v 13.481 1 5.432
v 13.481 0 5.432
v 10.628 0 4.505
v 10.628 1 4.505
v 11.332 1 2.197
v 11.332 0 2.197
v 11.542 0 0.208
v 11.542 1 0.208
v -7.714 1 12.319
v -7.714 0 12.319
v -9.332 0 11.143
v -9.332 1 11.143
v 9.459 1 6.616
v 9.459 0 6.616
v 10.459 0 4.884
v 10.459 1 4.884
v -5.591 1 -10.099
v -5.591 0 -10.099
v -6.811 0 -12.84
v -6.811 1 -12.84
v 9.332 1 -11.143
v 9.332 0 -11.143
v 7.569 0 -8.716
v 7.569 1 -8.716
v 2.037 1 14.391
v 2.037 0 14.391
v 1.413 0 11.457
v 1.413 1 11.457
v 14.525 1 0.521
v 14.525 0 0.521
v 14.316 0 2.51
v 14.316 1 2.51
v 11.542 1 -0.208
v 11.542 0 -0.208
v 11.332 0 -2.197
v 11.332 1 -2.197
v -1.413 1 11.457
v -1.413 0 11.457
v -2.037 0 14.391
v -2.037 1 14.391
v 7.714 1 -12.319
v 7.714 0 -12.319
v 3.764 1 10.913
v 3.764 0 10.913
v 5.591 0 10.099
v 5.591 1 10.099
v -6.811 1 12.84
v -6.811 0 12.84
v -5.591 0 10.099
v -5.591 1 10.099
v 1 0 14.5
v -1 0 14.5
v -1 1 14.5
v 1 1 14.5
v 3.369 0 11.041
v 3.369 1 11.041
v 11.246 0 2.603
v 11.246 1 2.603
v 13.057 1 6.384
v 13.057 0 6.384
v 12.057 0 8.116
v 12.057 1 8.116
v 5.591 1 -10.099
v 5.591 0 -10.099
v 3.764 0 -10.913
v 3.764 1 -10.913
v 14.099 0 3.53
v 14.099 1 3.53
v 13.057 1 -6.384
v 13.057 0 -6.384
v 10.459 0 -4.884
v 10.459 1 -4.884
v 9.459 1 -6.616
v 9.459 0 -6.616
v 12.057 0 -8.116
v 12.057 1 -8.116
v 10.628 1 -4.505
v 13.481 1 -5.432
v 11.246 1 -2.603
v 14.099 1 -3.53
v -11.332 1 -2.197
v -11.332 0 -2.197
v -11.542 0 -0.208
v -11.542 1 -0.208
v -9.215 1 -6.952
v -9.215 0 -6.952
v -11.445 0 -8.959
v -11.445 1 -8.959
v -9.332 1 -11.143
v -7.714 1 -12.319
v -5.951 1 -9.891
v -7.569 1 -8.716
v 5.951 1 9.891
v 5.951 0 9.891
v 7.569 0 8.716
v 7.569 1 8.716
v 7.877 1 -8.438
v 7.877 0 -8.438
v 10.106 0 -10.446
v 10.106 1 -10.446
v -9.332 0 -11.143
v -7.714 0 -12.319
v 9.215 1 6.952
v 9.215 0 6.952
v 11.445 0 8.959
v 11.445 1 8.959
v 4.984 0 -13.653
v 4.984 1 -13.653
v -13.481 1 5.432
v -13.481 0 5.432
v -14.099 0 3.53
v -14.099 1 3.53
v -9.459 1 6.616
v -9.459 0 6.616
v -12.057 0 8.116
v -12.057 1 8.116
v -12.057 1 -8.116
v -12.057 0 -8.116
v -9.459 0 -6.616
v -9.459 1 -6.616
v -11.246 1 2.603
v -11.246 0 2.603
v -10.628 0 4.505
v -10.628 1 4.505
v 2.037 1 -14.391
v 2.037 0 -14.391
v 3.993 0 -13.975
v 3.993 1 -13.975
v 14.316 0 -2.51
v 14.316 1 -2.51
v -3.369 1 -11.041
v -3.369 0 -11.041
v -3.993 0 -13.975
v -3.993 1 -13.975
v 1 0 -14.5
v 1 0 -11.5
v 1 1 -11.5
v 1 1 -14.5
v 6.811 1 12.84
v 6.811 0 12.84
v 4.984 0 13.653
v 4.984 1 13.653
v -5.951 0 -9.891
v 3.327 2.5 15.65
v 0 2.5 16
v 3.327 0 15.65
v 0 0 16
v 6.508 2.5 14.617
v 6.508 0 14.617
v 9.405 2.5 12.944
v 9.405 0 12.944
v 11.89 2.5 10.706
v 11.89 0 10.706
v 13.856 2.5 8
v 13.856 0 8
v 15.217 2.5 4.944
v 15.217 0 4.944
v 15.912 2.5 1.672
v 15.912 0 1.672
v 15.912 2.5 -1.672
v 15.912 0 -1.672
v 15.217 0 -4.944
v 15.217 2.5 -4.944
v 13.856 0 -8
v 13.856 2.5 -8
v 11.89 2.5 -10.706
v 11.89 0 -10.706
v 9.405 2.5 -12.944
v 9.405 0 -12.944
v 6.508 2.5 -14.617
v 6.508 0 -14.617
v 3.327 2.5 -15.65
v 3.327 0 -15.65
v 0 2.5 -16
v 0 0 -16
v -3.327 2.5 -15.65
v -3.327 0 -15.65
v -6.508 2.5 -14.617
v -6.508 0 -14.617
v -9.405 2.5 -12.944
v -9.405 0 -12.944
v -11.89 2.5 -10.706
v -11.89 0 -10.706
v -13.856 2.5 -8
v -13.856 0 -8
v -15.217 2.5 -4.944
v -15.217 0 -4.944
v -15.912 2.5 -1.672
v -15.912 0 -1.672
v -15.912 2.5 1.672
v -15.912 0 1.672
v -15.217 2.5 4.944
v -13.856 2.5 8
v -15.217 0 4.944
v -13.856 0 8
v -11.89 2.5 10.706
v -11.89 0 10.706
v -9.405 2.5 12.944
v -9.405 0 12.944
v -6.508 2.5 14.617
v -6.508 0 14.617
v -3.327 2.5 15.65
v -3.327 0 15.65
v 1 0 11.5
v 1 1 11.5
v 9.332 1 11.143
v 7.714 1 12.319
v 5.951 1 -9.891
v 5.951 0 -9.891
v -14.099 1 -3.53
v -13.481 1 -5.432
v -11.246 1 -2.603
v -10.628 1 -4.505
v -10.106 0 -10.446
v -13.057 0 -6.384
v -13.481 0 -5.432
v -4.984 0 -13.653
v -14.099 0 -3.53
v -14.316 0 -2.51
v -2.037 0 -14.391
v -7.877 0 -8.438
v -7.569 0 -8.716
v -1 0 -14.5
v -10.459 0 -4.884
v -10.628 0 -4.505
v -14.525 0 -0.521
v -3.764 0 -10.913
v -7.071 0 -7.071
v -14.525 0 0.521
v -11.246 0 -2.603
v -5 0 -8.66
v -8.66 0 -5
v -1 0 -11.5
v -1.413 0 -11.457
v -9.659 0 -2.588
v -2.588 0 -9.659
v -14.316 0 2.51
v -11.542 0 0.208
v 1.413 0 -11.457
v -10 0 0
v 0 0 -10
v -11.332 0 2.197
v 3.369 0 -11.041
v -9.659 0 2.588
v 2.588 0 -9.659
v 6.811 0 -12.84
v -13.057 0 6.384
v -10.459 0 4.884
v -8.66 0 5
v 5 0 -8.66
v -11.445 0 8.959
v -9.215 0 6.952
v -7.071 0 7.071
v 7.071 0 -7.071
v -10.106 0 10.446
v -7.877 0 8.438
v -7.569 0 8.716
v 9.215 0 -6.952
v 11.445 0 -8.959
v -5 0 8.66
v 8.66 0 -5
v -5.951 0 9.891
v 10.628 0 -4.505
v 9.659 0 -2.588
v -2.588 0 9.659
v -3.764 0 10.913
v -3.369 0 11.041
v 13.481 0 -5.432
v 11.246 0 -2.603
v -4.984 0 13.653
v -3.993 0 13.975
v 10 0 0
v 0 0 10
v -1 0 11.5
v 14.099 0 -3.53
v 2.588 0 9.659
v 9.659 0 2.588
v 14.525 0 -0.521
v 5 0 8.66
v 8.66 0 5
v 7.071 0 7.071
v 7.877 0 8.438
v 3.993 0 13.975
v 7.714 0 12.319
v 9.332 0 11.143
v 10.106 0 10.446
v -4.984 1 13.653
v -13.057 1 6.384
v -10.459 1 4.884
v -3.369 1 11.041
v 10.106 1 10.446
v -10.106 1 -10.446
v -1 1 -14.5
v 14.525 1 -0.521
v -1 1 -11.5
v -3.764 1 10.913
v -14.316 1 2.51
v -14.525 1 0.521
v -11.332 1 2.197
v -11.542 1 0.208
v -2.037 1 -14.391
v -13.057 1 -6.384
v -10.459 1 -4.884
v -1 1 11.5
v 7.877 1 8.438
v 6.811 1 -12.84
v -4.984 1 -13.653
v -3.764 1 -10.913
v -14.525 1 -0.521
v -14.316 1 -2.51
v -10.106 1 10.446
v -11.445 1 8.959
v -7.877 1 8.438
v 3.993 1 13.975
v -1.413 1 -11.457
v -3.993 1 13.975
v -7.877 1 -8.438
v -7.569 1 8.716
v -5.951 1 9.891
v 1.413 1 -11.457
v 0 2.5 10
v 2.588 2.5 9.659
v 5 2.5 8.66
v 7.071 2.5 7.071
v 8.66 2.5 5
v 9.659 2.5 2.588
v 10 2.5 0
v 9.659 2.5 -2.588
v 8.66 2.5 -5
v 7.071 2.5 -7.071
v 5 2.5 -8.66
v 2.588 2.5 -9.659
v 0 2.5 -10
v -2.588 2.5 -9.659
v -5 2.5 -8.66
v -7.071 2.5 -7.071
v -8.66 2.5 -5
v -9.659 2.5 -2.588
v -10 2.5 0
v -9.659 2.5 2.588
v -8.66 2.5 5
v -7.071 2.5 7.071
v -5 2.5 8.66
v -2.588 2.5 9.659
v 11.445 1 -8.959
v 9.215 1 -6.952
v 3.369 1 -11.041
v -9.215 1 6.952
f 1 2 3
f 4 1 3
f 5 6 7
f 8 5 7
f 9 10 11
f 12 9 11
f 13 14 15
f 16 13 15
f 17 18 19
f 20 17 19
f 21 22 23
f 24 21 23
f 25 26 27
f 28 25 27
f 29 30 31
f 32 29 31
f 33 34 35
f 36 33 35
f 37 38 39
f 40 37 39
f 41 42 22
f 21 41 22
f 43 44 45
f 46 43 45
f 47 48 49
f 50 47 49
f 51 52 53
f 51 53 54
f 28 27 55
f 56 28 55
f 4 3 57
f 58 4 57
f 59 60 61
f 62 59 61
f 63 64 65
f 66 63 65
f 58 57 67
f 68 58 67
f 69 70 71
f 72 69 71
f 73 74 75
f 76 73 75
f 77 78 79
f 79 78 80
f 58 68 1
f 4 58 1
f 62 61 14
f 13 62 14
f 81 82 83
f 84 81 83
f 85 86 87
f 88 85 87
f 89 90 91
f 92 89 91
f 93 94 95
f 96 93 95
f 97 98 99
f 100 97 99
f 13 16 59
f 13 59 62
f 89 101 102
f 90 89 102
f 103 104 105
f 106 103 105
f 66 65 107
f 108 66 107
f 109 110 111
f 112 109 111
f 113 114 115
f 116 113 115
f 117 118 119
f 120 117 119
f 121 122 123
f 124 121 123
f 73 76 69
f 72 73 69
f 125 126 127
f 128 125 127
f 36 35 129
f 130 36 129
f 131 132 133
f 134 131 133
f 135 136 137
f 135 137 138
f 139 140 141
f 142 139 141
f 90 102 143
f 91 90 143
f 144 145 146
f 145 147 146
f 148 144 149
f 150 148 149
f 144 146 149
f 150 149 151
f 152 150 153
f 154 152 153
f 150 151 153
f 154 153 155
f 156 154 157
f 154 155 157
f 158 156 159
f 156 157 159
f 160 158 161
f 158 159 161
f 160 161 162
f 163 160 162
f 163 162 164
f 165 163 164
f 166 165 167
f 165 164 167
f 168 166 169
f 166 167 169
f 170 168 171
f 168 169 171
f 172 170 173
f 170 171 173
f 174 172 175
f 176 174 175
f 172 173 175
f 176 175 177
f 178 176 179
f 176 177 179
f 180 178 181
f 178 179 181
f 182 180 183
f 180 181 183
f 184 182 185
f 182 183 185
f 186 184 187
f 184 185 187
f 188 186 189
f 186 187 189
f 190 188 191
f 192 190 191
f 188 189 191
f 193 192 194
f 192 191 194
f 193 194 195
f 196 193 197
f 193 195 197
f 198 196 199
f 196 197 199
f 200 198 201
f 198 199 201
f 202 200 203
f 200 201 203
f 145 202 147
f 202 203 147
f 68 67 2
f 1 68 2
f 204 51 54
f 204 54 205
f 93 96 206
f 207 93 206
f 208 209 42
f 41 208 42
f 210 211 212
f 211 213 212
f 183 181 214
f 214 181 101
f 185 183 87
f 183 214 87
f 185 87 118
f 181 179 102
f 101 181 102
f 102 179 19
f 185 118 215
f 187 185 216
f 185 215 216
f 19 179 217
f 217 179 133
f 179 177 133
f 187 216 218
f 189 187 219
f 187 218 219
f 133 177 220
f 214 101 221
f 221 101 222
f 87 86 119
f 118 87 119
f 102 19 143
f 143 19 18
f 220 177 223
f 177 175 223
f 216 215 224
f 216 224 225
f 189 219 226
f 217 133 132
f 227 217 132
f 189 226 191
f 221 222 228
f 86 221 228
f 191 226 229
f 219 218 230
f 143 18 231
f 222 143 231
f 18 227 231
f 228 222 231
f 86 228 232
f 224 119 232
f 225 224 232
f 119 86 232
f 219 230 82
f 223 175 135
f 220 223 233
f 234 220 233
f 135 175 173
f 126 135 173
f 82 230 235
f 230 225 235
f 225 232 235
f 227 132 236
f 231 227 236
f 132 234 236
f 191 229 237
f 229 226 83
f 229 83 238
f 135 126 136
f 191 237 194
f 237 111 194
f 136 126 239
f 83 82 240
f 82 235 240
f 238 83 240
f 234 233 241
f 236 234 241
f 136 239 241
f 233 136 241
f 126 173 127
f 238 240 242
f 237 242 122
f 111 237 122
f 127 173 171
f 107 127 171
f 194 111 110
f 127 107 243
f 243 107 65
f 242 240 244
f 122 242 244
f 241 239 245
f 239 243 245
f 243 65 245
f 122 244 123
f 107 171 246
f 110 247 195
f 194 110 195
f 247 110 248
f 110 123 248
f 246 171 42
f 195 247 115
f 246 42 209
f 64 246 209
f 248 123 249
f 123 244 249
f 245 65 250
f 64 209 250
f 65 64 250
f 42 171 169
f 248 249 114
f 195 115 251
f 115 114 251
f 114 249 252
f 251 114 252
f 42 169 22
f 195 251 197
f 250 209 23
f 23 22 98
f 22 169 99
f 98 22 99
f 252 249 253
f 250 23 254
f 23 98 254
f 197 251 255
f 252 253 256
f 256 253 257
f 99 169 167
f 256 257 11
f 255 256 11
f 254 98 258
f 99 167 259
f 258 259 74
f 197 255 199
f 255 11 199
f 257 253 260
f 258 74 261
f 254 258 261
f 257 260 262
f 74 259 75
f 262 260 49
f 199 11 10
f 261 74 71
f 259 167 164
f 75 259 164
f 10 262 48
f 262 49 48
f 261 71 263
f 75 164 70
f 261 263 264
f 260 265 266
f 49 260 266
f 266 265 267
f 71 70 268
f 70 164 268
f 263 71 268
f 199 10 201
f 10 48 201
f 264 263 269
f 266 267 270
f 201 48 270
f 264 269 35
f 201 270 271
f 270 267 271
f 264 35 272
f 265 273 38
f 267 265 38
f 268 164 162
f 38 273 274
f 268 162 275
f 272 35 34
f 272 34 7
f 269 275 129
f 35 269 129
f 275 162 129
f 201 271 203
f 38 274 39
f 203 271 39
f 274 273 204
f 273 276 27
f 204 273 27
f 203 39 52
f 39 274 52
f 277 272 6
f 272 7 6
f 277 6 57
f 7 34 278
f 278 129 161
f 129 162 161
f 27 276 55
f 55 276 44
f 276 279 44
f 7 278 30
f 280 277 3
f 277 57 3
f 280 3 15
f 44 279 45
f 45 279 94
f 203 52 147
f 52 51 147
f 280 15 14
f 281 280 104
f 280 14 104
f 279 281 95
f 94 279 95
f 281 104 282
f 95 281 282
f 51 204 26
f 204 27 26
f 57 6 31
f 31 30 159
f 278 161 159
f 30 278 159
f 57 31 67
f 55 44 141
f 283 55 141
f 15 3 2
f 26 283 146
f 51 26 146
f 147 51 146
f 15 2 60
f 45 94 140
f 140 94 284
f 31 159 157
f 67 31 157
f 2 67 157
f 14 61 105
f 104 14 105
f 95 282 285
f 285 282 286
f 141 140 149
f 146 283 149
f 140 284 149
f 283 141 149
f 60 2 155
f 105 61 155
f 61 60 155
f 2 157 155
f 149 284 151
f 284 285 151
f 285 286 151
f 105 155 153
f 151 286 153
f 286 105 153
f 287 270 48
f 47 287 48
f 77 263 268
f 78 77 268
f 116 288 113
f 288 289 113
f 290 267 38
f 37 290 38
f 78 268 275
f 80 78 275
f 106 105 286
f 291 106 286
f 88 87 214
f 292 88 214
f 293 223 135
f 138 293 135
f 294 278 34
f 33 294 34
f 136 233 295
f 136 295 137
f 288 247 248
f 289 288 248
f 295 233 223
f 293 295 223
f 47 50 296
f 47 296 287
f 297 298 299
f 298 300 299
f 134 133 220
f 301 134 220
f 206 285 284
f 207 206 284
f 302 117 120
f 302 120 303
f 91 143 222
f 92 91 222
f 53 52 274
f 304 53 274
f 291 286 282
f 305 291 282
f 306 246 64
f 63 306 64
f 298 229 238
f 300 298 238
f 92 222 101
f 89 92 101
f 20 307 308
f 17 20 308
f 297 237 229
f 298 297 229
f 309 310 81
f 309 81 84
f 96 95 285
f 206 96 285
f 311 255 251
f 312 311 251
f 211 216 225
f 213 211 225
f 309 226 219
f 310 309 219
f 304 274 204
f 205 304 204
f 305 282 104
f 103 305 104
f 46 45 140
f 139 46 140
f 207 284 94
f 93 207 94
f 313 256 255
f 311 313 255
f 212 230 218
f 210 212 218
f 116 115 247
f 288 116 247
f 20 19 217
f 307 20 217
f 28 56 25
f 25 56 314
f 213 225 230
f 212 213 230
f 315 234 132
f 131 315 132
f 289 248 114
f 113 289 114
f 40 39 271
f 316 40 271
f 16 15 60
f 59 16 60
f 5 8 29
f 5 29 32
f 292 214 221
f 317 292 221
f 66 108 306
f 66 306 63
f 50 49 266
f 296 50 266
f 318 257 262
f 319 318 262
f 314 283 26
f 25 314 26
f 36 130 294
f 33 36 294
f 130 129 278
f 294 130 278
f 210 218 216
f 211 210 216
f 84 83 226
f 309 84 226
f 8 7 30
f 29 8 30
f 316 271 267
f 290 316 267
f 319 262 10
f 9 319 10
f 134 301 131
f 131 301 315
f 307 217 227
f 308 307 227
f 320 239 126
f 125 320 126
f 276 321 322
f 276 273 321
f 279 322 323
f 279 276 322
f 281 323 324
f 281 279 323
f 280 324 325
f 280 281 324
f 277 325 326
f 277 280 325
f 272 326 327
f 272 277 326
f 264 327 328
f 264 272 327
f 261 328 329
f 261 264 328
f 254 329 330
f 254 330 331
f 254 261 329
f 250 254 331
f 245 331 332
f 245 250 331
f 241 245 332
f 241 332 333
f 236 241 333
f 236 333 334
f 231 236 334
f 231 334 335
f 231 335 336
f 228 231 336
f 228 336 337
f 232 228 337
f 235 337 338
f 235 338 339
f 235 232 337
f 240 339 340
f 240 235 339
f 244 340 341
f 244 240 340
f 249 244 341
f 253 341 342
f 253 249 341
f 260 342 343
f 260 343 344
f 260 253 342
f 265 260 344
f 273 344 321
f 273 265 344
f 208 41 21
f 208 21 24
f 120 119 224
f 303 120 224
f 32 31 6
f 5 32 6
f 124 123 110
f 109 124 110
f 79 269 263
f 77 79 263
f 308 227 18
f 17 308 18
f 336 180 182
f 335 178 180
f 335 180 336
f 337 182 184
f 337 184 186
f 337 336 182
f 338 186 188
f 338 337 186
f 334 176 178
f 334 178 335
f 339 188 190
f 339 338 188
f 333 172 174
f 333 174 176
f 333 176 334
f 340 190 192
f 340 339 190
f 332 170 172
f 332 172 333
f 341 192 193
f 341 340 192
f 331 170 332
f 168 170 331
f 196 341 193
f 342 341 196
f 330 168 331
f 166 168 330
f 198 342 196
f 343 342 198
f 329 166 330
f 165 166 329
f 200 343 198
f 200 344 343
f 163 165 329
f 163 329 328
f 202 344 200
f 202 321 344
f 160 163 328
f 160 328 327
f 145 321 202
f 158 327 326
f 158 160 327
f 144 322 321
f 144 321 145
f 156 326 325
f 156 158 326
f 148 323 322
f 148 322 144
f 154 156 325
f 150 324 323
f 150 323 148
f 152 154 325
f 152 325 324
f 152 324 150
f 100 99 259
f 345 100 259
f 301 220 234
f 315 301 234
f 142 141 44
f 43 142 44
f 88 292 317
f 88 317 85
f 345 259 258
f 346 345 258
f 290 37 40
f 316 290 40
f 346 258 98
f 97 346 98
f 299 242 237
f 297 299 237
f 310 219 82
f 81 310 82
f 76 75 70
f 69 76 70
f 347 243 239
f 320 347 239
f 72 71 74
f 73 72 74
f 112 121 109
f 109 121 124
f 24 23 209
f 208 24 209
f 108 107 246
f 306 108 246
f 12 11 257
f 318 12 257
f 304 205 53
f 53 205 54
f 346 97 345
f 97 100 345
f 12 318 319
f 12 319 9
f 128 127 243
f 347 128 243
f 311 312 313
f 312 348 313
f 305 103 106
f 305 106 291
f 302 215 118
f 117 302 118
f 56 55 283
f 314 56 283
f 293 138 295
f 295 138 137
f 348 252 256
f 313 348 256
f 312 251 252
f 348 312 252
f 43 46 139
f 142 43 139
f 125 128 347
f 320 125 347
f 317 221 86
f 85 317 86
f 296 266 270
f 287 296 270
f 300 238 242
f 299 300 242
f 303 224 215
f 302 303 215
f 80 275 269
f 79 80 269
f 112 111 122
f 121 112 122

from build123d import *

# Parameters (mm, degrees)
SKETCH1_R           = 16
SKETCH1_W           = 2
SKETCH1_H           = 3
SKETCH1_R_2         = 10
BOSS_EXTRUDE3_DEPTH = 1
SKETCH2_R           = 16
SKETCH2_R_2         = 10
BOSS_EXTRUDE4_DEPTH = 1.5


with BuildPart() as part:
    # Sketch1 → Boss-Extrude3 (new body)
    with BuildSketch(Plane(origin=(0, 0, 0), x_dir=(1, 0, 0), z_dir=(0, 1, 0))):
        with Locations(Location((0, 0, 0), (0, 0, 270))):
            Circle(SKETCH1_R)
        Polygon((3.992867118, 13.97522852), (3.369132045, 11.040785718), (1.412836844, 11.456609099), (2.036571916, 14.391051901), align=None, mode=Mode.SUBTRACT)
        with Locations((0, 13)):
            Rectangle(SKETCH1_W, SKETCH1_H, mode=Mode.SUBTRACT)
        Polygon((6.811226782, 12.839672493), (5.591016853, 10.09903612), (3.763925938, 10.912509406), (4.984135867, 13.653145779), align=None, mode=Mode.SUBTRACT)
        Polygon((-2.036571916, 14.391051901), (-1.412836844, 11.456609099), (-3.369132045, 11.040785718), (-3.992867118, 13.97522852), align=None, mode=Mode.SUBTRACT)
        Polygon((9.331903153, 11.142961166), (7.568547396, 8.715910183), (5.950513407, 9.891480688), (7.713869164, 12.318531671), align=None, mode=Mode.SUBTRACT)
        Polygon((-4.984135867, 13.653145779), (-3.763925938, 10.912509406), (-5.591016853, 10.09903612), (-6.811226782, 12.839672493), align=None, mode=Mode.SUBTRACT)
        Polygon((-9.331903153, -11.142961166), (-7.568547396, -8.715910183), (-5.950513407, -9.891480688), (-7.713869164, -12.318531671), align=None, mode=Mode.SUBTRACT)
        Polygon((-11.444730576, -8.959248967), (-9.215296099, -6.951857148), (-7.877034887, -8.438146799), (-10.106469363, -10.445538618), align=None, mode=Mode.SUBTRACT)
        Polygon((-6.811226782, -12.839672493), (-5.591016853, -10.09903612), (-3.763925938, -10.912509406), (-4.984135867, -13.653145779), align=None, mode=Mode.SUBTRACT)
        with Locations((0, -13)):
            Rectangle(SKETCH1_W, SKETCH1_H, mode=Mode.SUBTRACT)
        Polygon((-1.412836844, -11.456609099), (-2.036571916, -14.391051901), (-3.992867118, -13.97522852), (-3.369132045, -11.040785718), align=None, mode=Mode.SUBTRACT)
        Polygon((-13.057368355, -6.383974596), (-10.459292144, -4.883974596), (-9.459292144, -6.616025404), (-12.057368355, -8.116025404), align=None, mode=Mode.SUBTRACT)
        Polygon((-14.099336481, -3.529689902), (-11.246166932, -2.602638919), (-10.628132943, -4.504751952), (-13.481302492, -5.431802935), align=None, mode=Mode.SUBTRACT)
        Polygon((-14.525095946, -0.521140822), (-11.54153026, -0.207555432), (-11.332473333, -2.196599223), (-14.31603902, -2.510184613), align=None, mode=Mode.SUBTRACT)
        Polygon((2.036571916, -14.391051901), (1.412836844, -11.456609099), (3.369132045, -11.040785718), (3.992867118, -13.97522852), align=None, mode=Mode.SUBTRACT)
        Polygon((4.984135867, -13.653145779), (3.763925938, -10.912509406), (5.591016853, -10.09903612), (6.811226782, -12.839672493), align=None, mode=Mode.SUBTRACT)
        Polygon((7.713869164, -12.318531671), (5.950513407, -9.891480688), (7.568547396, -8.715910183), (9.331903153, -11.142961166), align=None, mode=Mode.SUBTRACT)
        Polygon((10.106469363, -10.445538618), (7.877034887, -8.438146799), (9.215296099, -6.951857148), (11.444730576, -8.959248967), align=None, mode=Mode.SUBTRACT)
        Polygon((12.057368355, -8.116025404), (9.459292144, -6.616025404), (10.459292144, -4.883974596), (13.057368355, -6.383974596), align=None, mode=Mode.SUBTRACT)
        Polygon((13.481302492, -5.431802935), (10.628132943, -4.504751952), (11.246166932, -2.602638919), (14.099336481, -3.529689902), align=None, mode=Mode.SUBTRACT)
        Polygon((14.31603902, -2.510184613), (11.332473333, -2.196599223), (11.54153026, -0.207555432), (14.525095946, -0.521140822), align=None, mode=Mode.SUBTRACT)
        Polygon((-14.31603902, 2.510184613), (-11.332473333, 2.196599223), (-11.54153026, 0.207555432), (-14.525095946, 0.521140822), align=None, mode=Mode.SUBTRACT)
        Polygon((-13.481302492, 5.431802935), (-10.628132943, 4.504751952), (-11.246166932, 2.602638919), (-14.099336481, 3.529689902), align=None, mode=Mode.SUBTRACT)
        with Locations(Location((0, 0, 0), (0, 0, 270))):
            Circle(SKETCH1_R_2, mode=Mode.SUBTRACT)
        Polygon((-12.057368355, 8.116025404), (-9.459292144, 6.616025404), (-10.459292144, 4.883974596), (-13.057368355, 6.383974596), align=None, mode=Mode.SUBTRACT)
        Polygon((-10.106469363, 10.445538618), (-7.877034887, 8.438146799), (-9.215296099, 6.951857148), (-11.444730576, 8.959248967), align=None, mode=Mode.SUBTRACT)
        Polygon((-7.713869164, 12.318531671), (-5.950513407, 9.891480688), (-7.568547396, 8.715910183), (-9.331903153, 11.142961166), align=None, mode=Mode.SUBTRACT)
        Polygon((14.525095946, 0.521140822), (11.54153026, 0.207555432), (11.332473333, 2.196599223), (14.31603902, 2.510184613), align=None, mode=Mode.SUBTRACT)
        Polygon((14.099336481, 3.529689902), (11.246166932, 2.602638919), (10.628132943, 4.504751952), (13.481302492, 5.431802935), align=None, mode=Mode.SUBTRACT)
        Polygon((7.877034887, 8.438146799), (10.106469363, 10.445538618), (11.444730576, 8.959248967), (9.215296099, 6.951857148), align=None, mode=Mode.SUBTRACT)
        Polygon((13.057368355, 6.383974596), (10.459292144, 4.883974596), (9.459292144, 6.616025404), (12.057368355, 8.116025404), align=None, mode=Mode.SUBTRACT)
    extrude(amount=BOSS_EXTRUDE3_DEPTH)

    # Sketch2 → Boss-Extrude4 (add)
    with BuildSketch(Plane(origin=(0, 1, 0), x_dir=(1, 0, 0), z_dir=(0, 1, 0))):
        with Locations(Location((0, 0, 0), (0, 0, 270))):
            Circle(SKETCH2_R)
        with Locations(Location((0, 0, 0), (0, 0, 270))):
            Circle(SKETCH2_R_2, mode=Mode.SUBTRACT)
    extrude(amount=BOSS_EXTRUDE4_DEPTH)


solid = part.part
